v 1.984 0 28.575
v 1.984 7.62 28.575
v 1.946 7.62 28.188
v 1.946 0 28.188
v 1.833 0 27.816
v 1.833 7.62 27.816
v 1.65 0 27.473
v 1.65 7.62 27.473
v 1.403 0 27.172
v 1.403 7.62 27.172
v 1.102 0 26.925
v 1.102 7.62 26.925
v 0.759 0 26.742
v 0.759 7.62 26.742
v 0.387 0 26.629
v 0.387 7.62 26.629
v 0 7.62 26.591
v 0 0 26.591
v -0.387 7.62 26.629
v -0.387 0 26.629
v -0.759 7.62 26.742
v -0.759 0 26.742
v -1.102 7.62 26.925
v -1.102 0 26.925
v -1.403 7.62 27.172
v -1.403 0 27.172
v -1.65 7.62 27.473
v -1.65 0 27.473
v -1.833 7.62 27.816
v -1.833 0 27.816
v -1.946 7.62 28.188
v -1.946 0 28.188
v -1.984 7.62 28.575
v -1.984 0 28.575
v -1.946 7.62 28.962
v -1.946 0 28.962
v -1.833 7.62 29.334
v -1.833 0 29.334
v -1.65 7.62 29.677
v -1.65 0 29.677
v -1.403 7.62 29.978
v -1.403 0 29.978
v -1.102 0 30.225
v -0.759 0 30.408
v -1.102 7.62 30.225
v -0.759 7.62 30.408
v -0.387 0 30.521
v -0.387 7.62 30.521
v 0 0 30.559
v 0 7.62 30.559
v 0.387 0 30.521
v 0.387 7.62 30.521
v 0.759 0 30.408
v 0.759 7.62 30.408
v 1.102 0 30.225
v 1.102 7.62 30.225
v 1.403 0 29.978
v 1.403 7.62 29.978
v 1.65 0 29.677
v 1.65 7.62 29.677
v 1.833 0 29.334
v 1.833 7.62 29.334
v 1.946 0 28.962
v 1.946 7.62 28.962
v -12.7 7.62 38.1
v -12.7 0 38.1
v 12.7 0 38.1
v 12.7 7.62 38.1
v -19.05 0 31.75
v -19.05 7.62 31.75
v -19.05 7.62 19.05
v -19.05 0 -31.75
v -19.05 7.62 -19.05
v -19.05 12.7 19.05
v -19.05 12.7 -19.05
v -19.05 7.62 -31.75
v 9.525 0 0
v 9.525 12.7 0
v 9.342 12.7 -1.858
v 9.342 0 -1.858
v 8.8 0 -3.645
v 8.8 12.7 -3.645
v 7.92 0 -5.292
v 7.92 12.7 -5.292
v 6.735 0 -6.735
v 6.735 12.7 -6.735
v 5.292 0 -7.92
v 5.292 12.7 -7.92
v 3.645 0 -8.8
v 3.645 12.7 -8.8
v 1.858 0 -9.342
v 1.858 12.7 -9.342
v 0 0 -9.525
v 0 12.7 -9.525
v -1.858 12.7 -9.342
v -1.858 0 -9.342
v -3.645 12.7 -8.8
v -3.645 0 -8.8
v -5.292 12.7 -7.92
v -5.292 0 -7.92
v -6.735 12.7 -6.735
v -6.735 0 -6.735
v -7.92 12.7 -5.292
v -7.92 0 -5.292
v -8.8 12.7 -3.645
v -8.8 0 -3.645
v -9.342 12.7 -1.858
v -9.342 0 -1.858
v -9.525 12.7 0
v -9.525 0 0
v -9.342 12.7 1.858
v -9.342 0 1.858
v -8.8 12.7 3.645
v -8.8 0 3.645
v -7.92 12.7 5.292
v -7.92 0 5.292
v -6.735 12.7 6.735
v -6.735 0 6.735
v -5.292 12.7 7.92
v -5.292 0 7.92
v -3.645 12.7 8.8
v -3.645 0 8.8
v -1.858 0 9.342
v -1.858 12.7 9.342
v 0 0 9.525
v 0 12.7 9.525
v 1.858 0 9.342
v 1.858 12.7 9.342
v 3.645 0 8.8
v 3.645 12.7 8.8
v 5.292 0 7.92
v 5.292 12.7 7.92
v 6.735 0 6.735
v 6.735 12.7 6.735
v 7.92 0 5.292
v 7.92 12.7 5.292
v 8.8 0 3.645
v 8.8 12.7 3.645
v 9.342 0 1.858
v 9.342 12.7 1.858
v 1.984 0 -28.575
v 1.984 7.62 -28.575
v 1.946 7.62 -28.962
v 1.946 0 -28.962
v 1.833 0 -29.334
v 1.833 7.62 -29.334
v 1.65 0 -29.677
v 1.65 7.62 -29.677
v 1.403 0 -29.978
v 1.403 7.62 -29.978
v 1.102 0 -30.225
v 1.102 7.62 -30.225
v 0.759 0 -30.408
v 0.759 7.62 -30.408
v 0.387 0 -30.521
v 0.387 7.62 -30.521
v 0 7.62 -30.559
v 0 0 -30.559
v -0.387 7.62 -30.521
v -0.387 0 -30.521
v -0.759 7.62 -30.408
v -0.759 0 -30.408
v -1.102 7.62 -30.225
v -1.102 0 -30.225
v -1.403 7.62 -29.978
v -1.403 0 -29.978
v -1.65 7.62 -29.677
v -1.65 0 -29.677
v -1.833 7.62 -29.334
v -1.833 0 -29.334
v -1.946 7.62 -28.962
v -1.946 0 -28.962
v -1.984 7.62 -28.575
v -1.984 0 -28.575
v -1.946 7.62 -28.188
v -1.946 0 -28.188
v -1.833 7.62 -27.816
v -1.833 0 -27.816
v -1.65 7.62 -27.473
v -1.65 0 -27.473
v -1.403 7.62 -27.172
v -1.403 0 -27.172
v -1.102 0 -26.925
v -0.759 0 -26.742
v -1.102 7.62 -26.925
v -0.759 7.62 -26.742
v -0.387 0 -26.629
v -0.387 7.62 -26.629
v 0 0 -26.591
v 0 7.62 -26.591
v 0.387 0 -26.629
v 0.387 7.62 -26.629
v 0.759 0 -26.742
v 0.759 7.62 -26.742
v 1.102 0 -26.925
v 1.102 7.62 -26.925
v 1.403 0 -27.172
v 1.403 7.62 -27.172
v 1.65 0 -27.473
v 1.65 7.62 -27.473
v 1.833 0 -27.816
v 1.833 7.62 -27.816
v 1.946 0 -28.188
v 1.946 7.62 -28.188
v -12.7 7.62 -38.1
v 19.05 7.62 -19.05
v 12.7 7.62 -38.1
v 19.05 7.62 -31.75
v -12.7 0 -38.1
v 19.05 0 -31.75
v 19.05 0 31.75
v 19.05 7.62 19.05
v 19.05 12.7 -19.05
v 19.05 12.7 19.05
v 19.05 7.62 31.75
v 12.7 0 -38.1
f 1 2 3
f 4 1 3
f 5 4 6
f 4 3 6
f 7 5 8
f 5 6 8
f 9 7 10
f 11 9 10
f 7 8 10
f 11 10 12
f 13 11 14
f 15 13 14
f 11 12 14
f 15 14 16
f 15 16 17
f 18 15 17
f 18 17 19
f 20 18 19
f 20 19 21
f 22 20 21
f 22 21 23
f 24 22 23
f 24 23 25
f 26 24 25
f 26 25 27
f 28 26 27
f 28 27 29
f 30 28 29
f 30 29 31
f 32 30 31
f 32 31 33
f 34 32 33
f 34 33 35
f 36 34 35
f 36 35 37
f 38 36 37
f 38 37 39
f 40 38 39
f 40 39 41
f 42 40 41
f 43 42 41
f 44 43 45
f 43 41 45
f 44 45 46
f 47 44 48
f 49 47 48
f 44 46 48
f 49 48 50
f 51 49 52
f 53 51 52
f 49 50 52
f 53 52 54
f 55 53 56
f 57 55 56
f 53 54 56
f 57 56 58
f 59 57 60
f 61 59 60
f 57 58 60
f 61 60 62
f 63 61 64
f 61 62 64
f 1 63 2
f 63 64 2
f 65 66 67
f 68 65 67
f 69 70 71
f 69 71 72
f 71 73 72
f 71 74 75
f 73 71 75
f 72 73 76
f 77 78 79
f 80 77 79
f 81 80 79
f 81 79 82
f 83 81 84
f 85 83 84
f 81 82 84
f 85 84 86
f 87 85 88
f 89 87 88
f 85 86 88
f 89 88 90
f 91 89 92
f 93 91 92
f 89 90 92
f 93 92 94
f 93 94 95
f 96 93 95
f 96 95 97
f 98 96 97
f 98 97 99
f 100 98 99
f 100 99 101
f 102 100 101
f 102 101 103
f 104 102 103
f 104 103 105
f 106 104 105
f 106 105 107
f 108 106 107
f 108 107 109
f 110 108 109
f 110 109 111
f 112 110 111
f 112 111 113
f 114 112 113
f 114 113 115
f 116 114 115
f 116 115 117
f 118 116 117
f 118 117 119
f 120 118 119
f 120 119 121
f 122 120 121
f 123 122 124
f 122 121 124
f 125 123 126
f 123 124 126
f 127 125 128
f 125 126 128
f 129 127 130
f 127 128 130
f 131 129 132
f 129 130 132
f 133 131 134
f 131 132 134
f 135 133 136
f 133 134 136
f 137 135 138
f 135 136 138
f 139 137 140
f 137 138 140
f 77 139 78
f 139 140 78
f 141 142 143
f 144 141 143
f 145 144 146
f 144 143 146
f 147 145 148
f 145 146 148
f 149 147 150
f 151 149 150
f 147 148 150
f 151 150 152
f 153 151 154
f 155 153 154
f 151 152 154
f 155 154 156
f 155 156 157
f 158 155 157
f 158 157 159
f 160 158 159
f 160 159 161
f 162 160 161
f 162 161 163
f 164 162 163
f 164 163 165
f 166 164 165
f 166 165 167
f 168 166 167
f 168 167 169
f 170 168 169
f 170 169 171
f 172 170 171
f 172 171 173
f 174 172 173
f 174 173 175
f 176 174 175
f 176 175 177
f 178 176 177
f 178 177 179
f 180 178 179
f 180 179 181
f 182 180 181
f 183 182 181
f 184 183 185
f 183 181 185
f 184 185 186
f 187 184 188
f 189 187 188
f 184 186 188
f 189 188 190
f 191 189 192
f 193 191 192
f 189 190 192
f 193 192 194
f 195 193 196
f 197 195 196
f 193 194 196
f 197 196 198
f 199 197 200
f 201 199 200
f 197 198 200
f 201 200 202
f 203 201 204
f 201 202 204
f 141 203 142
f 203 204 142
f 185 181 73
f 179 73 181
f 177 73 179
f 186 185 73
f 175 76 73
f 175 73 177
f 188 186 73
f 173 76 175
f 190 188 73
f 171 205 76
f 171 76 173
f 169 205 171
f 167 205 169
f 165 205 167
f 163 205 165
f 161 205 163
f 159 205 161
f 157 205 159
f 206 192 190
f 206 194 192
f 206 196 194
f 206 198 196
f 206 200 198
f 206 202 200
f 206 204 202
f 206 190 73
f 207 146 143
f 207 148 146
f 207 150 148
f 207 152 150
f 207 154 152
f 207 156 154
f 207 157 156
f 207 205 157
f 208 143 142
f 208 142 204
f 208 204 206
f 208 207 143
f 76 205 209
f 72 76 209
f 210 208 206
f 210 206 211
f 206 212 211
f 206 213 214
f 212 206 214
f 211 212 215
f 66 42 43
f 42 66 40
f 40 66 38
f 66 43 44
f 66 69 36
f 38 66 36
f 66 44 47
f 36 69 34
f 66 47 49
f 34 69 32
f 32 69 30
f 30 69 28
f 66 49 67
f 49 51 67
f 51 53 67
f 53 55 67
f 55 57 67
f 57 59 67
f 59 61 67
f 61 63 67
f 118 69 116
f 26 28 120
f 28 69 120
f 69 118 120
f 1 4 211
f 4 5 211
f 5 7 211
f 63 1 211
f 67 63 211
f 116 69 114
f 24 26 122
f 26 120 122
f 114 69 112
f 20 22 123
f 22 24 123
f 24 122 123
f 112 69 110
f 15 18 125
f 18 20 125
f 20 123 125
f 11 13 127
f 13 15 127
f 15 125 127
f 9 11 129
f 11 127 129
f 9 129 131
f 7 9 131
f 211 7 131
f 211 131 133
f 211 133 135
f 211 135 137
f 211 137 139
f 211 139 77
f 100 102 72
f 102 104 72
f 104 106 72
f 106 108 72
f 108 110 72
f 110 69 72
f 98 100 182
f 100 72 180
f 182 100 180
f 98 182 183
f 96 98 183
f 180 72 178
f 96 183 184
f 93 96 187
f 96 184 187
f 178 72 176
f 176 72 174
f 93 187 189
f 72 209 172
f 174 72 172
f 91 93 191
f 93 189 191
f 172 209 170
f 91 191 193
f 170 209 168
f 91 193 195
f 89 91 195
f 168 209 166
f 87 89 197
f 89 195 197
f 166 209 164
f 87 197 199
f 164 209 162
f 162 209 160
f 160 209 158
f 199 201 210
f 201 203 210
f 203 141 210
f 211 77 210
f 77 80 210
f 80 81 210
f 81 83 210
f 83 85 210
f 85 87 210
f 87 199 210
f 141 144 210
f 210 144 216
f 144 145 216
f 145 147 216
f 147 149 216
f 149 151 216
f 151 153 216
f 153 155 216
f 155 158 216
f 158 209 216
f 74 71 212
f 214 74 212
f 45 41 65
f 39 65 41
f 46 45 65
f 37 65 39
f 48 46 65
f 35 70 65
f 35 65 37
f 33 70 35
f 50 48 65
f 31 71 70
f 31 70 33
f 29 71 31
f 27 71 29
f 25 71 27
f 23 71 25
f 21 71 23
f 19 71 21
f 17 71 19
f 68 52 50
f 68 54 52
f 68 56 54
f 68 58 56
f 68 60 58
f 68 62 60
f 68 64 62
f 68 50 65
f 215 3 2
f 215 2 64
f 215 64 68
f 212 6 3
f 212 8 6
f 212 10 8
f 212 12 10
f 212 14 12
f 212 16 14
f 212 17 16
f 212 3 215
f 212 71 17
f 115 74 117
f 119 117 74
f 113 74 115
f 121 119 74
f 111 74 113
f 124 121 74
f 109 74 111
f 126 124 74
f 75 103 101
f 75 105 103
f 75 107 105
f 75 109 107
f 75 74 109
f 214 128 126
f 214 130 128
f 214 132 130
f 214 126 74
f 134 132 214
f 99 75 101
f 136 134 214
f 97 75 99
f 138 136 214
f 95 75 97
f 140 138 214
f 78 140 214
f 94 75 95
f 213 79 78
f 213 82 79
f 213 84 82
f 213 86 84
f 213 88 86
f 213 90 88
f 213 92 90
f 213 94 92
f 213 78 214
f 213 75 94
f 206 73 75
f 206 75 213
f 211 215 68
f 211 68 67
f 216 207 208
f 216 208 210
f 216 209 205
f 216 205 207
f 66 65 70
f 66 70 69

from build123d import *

# Parameters (mm, degrees)
SKETCH1_W           = 76.2
SKETCH1_H           = 76.2
BOSS_EXTRUDE1_DEPTH = 7.62
SKETCH2_W           = 38.1
SKETCH2_H           = 38.1
BOSS_EXTRUDE2_DEPTH = 5.08
SKETCH3_R           = 9.525
CUT_EXTRUDE1_DEPTH  = 13.7
SKETCH4_R           = 1.984375
CUT_EXTRUDE2_DEPTH  = 13.7
CUT_EXTRUDE3_DEPTH  = 8.62
CHAMFER1_SIZE       = 6.35


with BuildPart() as part:
    # Sketch1 → Boss-Extrude1 (new body)
    with BuildSketch(Plane(origin=(0, 0, 0), x_dir=(1, 0, 0), z_dir=(0, 1, 0))):
        Rectangle(SKETCH1_W, SKETCH1_H)
    extrude(amount=BOSS_EXTRUDE1_DEPTH)

    # Sketch2 → Boss-Extrude2 (add)
    with BuildSketch(Plane(origin=(0, 7.62, 0), x_dir=(1, 0, 0), z_dir=(0, 1, 0))):
        Rectangle(SKETCH2_W, SKETCH2_H)
    extrude(amount=BOSS_EXTRUDE2_DEPTH)

    # Sketch3 → Cut-Extrude1 (cut, through all)
    with BuildSketch(Plane(origin=(0, 12.7, 0), x_dir=(1, 0, 0), z_dir=(0, 1, 0))):
        Circle(SKETCH3_R)
    extrude(amount=-CUT_EXTRUDE1_DEPTH, mode=Mode.SUBTRACT)

    # Sketch4 → Cut-Extrude2 (cut, through all)
    with BuildSketch(Plane(origin=(0, 12.7, 0), x_dir=(1, 0, 0), z_dir=(0, 1, 0))):
        with Locations((0, 28.575)):
            Circle(SKETCH4_R)
        with Locations((0, -28.575)):
            Circle(SKETCH4_R)
    extrude(amount=-CUT_EXTRUDE2_DEPTH, mode=Mode.SUBTRACT)

    # Sketch5 → Cut-Extrude3 (cut, through all)
    with BuildSketch(Plane(origin=(0, 7.62, 0), x_dir=(1, 0, 0), z_dir=(0, 1, 0))):
        Polygon((-38.1, -38.1), (-19.05, -38.1), (-19.05, 19.05), (-19.05, 38.1), (-38.1, 38.1), (-38.1, 19.05), align=None)
        Polygon((19.05, 38.1), (19.05, 19.05), (19.05, -38.1), (38.1, -38.1), (38.1, 19.05), (38.1, 38.1), align=None)
    extrude(amount=-CUT_EXTRUDE3_DEPTH, mode=Mode.SUBTRACT)

    # Chamfer1
    chamfer1_edges = [part.edges().sort_by_distance(p)[0] for p in [
        (-19.05, 3.81, -38.1),
        (-19.05, 3.81, 38.1),
        (19.05, 3.81, -38.1),
        (19.05, 3.81, 38.1),
    ]]
    chamfer(chamfer1_edges, length=CHAMFER1_SIZE)


solid = part.part
